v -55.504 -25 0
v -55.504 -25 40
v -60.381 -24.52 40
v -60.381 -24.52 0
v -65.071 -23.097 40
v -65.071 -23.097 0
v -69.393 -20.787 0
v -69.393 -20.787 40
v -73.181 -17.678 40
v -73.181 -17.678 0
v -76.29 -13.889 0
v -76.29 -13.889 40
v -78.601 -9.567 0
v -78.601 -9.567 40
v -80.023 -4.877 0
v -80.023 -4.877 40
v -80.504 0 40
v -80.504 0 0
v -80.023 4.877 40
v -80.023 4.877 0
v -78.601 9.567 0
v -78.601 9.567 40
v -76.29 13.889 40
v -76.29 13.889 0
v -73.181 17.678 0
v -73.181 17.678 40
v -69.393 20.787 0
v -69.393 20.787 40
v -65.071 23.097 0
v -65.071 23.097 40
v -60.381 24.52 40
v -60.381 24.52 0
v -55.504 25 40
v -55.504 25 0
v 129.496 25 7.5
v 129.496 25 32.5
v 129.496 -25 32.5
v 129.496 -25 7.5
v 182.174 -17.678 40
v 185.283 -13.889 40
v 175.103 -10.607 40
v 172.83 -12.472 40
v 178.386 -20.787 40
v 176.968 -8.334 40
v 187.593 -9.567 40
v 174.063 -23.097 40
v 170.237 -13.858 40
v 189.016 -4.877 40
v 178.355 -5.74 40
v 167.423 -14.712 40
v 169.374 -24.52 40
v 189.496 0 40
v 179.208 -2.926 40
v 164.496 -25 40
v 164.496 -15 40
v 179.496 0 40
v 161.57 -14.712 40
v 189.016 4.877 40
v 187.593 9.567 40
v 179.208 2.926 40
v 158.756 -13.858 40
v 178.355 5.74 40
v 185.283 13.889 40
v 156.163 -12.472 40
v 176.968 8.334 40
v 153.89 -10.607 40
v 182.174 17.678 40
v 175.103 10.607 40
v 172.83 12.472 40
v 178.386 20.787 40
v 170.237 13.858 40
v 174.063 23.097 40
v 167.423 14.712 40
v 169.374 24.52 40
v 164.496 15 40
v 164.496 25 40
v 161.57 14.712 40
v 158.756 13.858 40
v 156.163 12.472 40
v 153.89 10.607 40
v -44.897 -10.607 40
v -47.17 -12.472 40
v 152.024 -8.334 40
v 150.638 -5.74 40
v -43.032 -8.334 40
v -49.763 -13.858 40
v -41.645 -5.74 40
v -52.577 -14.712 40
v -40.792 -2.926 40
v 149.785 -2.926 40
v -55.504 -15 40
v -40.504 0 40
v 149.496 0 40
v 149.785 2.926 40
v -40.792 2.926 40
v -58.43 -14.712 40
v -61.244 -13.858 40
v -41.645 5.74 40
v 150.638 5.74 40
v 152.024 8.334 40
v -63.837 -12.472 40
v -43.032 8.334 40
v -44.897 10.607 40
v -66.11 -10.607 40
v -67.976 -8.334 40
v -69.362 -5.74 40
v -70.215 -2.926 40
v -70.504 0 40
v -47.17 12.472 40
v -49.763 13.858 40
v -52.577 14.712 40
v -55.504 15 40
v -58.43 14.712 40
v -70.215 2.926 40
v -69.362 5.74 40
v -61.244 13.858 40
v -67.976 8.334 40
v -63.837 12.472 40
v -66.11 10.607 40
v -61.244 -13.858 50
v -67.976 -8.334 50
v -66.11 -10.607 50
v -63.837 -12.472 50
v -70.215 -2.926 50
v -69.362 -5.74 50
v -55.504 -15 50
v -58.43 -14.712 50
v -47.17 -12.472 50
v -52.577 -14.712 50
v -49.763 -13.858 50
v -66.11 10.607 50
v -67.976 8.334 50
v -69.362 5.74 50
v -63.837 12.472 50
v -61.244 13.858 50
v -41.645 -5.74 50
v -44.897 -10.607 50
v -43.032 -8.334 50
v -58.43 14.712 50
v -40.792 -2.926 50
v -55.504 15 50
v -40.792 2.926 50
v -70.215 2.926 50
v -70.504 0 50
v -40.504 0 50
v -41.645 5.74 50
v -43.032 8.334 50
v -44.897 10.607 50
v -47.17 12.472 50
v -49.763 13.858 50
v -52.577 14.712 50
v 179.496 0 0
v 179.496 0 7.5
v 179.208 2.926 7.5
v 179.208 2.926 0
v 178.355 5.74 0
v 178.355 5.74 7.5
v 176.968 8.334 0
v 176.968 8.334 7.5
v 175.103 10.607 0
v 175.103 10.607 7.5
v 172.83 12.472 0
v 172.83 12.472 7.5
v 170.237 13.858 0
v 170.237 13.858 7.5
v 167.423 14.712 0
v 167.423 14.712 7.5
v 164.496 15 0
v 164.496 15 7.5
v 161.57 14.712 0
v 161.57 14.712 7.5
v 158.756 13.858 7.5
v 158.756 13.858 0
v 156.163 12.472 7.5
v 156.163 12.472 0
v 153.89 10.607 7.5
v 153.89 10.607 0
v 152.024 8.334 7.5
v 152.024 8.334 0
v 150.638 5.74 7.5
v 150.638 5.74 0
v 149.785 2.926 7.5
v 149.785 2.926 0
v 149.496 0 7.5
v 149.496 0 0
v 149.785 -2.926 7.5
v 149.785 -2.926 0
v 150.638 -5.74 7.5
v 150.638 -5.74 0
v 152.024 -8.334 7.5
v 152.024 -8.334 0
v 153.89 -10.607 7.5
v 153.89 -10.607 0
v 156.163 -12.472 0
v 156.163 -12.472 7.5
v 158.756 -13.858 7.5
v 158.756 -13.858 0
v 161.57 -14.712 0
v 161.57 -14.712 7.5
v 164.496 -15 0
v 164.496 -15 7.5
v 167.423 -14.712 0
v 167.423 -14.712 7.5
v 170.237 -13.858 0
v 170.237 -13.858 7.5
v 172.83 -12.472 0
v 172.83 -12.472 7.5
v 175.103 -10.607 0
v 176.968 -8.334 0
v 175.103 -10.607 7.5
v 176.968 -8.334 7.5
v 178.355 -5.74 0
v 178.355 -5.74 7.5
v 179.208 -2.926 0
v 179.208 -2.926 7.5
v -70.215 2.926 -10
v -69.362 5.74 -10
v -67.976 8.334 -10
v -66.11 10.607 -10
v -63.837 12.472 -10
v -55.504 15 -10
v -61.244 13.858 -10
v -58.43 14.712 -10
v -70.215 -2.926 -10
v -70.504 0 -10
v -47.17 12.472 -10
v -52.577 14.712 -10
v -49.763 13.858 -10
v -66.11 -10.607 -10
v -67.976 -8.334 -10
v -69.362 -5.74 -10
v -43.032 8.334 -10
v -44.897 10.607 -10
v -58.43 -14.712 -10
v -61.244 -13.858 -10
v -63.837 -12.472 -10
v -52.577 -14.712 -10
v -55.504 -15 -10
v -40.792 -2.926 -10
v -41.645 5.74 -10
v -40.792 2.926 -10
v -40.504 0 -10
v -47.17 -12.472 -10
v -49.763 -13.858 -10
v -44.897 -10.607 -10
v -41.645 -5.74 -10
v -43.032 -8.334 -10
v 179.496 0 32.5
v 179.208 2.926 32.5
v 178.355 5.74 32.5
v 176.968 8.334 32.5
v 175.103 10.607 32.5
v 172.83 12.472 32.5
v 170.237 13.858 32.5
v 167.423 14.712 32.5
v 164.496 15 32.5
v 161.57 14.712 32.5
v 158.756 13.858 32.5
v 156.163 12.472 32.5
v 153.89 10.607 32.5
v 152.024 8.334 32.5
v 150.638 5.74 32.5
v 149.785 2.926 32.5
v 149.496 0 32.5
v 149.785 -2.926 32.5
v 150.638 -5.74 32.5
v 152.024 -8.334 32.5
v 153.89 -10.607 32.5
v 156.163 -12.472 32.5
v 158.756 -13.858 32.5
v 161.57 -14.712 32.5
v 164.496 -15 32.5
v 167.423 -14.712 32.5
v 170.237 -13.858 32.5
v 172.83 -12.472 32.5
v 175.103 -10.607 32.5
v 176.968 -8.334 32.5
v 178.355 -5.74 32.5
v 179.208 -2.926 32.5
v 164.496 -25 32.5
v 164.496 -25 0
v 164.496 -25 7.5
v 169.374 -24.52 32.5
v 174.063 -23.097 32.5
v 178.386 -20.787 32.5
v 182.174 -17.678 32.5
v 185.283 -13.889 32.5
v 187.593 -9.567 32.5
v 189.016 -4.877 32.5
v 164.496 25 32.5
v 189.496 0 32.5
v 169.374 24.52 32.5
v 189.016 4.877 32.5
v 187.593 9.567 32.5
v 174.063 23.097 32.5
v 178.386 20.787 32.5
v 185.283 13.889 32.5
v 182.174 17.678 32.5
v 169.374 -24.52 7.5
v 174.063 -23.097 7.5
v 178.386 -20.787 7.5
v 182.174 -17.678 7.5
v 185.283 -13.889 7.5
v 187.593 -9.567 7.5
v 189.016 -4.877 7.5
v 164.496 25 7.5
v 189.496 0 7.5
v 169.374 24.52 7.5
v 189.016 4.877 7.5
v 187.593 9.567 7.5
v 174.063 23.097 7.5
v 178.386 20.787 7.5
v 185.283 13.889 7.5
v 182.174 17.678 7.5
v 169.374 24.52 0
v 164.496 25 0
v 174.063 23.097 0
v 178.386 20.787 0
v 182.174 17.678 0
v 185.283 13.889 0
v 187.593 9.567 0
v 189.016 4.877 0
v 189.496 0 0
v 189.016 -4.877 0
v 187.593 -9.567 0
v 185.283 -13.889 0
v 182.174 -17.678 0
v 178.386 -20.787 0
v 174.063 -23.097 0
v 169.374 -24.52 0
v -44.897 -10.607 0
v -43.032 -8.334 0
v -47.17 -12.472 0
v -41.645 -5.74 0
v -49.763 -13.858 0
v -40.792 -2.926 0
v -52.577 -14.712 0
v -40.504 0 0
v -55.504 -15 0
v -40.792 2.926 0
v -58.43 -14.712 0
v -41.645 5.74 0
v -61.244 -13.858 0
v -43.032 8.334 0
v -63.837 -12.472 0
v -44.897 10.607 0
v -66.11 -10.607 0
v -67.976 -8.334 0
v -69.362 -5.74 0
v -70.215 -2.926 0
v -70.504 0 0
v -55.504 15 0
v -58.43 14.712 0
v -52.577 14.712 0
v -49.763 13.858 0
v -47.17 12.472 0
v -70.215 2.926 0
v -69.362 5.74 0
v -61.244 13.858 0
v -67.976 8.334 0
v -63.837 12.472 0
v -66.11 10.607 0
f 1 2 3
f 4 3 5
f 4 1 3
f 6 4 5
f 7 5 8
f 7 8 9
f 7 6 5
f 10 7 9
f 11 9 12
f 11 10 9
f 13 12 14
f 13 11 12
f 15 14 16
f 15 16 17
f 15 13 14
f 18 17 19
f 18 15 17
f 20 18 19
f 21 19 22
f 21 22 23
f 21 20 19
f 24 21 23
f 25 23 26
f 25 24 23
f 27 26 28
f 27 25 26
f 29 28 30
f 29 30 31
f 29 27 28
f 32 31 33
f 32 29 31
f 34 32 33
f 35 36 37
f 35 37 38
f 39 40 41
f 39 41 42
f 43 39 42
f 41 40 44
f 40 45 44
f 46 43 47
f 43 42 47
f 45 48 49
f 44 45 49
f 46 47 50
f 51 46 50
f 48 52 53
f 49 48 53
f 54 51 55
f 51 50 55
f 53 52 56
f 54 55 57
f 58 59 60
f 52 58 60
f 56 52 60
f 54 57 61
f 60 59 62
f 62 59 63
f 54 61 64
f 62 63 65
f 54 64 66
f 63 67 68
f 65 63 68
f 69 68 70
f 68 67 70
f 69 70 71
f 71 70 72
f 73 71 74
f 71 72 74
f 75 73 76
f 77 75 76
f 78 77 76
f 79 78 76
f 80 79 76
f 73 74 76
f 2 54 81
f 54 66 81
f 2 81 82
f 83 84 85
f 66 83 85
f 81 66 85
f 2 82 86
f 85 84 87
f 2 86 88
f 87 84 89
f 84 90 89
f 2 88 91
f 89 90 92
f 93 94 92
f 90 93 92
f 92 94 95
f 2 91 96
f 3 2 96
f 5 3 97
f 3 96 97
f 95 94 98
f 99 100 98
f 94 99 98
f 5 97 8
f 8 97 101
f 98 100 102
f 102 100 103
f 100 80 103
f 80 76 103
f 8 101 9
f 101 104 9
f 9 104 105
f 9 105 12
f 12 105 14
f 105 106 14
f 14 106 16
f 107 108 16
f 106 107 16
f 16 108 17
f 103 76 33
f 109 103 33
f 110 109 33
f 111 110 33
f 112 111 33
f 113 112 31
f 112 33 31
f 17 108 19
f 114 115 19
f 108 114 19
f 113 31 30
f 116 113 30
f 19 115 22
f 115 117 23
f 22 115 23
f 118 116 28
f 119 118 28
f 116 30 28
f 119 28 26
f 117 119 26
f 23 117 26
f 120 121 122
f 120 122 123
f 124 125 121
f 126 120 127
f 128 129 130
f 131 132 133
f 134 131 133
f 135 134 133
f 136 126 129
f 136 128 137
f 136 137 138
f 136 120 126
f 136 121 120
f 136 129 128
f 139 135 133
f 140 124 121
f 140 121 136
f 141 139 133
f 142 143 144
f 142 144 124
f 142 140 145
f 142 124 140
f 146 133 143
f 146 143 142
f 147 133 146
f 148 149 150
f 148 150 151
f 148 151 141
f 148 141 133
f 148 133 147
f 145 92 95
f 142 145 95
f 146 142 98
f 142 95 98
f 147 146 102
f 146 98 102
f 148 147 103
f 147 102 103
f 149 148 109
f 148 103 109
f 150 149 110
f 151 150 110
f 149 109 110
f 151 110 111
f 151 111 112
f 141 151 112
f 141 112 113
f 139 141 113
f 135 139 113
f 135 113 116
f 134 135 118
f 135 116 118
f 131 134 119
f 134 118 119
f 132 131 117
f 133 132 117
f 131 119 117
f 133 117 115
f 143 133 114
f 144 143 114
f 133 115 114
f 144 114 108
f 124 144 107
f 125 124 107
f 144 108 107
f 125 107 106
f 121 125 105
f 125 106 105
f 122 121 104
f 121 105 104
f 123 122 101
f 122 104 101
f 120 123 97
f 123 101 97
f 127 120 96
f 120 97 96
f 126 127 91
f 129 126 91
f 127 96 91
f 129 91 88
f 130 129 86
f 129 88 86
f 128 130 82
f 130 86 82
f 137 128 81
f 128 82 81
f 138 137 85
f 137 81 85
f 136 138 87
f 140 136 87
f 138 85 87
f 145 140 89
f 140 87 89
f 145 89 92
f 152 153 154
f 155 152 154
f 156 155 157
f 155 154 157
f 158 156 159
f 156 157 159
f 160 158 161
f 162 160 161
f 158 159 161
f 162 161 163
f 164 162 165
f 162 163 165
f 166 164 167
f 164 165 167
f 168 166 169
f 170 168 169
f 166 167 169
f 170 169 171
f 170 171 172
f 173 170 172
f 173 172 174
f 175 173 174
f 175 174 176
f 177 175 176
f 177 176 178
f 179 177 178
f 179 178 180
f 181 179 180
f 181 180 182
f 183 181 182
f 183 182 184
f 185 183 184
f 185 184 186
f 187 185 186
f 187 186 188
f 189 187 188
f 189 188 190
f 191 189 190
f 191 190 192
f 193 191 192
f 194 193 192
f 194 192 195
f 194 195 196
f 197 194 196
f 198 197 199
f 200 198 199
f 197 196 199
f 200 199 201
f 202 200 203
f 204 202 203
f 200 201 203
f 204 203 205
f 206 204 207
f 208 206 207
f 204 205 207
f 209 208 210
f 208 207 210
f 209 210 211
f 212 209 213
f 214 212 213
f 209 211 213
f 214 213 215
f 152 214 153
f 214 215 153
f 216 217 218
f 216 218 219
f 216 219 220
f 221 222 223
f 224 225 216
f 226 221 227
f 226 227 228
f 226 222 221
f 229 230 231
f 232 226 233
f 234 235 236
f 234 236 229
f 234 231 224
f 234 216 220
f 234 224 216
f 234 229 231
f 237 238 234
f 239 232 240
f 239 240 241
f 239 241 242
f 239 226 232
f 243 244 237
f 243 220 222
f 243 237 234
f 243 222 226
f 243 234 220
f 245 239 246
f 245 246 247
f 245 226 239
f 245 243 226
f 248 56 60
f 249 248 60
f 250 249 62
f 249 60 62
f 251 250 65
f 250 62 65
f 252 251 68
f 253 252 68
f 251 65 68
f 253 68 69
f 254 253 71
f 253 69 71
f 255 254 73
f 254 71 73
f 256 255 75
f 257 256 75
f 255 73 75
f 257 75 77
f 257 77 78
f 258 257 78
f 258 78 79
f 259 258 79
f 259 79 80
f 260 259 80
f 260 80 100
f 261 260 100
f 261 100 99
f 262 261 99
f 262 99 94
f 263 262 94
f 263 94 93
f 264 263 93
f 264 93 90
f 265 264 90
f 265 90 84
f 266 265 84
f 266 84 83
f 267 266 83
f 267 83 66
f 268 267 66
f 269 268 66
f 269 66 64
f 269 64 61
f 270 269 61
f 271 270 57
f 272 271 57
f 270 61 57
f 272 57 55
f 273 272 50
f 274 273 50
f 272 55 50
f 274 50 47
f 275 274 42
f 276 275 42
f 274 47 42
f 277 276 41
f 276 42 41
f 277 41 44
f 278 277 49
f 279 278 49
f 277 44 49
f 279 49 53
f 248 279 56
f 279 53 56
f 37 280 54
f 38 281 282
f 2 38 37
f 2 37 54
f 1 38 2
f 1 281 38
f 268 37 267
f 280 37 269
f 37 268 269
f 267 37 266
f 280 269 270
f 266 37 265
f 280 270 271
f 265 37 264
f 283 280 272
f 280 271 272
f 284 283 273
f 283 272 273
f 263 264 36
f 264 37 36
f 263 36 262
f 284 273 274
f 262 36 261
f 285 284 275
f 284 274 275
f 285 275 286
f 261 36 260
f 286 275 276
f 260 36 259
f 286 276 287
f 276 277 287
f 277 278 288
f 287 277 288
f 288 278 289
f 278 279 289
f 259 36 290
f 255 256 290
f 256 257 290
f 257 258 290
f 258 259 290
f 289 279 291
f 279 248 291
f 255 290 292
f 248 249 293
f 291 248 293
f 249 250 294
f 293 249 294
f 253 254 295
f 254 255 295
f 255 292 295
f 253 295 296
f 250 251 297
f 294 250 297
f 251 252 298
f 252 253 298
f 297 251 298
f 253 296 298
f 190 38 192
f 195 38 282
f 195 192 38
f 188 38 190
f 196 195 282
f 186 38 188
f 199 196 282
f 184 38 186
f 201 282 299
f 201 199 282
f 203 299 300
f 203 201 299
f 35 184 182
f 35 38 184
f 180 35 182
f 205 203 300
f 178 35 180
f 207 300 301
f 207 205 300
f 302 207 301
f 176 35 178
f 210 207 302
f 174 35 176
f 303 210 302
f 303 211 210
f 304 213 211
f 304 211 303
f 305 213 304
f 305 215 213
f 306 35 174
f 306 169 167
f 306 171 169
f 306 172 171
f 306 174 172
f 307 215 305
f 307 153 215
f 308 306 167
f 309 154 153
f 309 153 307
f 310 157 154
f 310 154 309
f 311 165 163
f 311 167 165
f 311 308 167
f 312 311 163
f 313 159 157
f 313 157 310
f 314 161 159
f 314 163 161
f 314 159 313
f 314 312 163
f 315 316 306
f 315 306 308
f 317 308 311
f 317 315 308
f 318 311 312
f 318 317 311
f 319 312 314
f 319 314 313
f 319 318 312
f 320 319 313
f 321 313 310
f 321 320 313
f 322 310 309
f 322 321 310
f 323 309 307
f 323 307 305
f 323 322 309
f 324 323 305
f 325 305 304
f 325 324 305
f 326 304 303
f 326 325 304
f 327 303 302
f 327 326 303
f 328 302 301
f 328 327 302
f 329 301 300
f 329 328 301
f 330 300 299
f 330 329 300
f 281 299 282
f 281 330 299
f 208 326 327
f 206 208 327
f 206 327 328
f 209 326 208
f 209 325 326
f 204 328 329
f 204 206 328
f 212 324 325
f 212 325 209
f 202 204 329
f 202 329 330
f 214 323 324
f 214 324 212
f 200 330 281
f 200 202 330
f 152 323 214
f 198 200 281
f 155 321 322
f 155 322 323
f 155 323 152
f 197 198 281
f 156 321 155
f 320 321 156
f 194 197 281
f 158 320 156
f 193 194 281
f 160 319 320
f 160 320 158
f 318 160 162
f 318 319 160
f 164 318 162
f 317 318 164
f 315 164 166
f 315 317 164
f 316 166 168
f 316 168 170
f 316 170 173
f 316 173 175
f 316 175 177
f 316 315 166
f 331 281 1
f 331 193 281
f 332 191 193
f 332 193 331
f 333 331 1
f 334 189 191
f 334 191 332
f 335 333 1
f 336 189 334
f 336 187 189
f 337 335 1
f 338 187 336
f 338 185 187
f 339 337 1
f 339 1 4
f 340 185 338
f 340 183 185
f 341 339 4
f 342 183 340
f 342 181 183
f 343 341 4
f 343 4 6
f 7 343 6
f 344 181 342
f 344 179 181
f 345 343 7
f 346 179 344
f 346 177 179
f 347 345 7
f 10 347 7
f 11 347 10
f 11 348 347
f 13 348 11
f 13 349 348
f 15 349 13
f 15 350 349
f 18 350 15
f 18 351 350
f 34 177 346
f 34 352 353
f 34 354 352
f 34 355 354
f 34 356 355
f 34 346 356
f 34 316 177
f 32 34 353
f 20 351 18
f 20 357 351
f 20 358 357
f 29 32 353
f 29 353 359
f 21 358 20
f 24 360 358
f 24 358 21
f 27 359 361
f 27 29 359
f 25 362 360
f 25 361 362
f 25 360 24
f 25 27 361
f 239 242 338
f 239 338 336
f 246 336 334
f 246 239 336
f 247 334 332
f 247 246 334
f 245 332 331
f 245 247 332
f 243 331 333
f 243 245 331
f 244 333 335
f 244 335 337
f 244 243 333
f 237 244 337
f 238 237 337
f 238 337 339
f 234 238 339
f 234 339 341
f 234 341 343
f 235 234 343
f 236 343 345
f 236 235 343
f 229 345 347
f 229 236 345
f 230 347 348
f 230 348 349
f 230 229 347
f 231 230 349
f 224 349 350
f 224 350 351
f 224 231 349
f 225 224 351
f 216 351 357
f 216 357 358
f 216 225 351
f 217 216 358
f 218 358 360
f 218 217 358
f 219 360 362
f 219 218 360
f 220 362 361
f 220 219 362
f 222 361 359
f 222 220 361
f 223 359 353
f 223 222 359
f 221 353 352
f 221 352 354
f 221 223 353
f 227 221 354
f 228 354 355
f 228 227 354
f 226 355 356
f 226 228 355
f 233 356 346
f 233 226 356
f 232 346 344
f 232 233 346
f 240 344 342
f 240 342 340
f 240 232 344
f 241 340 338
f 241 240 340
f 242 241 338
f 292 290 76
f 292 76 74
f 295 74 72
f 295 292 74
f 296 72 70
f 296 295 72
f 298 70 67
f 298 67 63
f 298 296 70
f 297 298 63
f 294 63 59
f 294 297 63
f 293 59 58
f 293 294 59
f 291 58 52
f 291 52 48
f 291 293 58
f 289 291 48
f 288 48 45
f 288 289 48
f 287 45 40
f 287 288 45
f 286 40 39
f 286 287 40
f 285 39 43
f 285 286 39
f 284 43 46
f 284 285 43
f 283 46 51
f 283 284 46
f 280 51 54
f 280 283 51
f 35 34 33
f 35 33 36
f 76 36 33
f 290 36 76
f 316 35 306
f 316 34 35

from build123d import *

# Parameters (mm, degrees)
BOSS_EXTRUDE1_DEPTH = 40
SKETCH3_R           = 15
BOSS_EXTRUDE2_DEPTH = 10
BOSS_EXTRUDE3_START = 10
SKETCH4_R           = 15
BOSS_EXTRUDE3_DEPTH = 10
SKETCH5_W           = 60
SKETCH5_H           = 25
CUT_EXTRUDE1_DEPTH  = 203.25937939
SKETCH6_R           = 15
CUT_EXTRUDE2_DEPTH  = 198.569877641


with BuildPart() as part:
    # Sketch1 → Boss-Extrude1 (new body)
    with BuildSketch(Plane.XY):
        with BuildLine():
            Line((-55.503676682, 25), (164.496323318, 25))
            ThreePointArc((164.496323318, 25), (189.496323318, 0), (164.496323318, -25))
            Line((164.496323318, -25), (-55.503676682, -25))
            ThreePointArc((-55.503676682, -25), (-80.503676682, 0), (-55.503676682, 25))
        make_face()
    extrude(amount=BOSS_EXTRUDE1_DEPTH)

    # Sketch3 → Boss-Extrude2 (add)
    with BuildSketch(Plane.XY.offset(40)):
        with Locations((-55.503676682, 0)):
            Circle(SKETCH3_R)
    extrude(amount=BOSS_EXTRUDE2_DEPTH)

    # Sketch4 → Boss-Extrude3 (add)
    with BuildSketch(Plane(origin=(0, 0, 0), x_dir=(-1, 0, 0), z_dir=(0, 0, -1)).offset(BOSS_EXTRUDE3_START)):
        with Locations(Location((55.503676682, 0, 0), (0, 0, 180))):
            Circle(SKETCH4_R)
    extrude(amount=-BOSS_EXTRUDE3_DEPTH)

    # Sketch5 → Cut-Extrude1 (cut, through all)
    with BuildSketch(Plane(origin=(0, 25, 0), x_dir=(1, 0, 0), z_dir=(0, 1, 0))):
        with Locations((159.496323318, -20)):
            Rectangle(SKETCH5_W, SKETCH5_H)
    extrude(amount=-CUT_EXTRUDE1_DEPTH, mode=Mode.SUBTRACT)

    # Sketch6 → Cut-Extrude2 (cut, through all)
    with BuildSketch(Plane.XY.offset(40)):
        with Locations((164.496323318, 0)):
            Circle(SKETCH6_R)
    extrude(amount=-CUT_EXTRUDE2_DEPTH, mode=Mode.SUBTRACT)


solid = part.part
